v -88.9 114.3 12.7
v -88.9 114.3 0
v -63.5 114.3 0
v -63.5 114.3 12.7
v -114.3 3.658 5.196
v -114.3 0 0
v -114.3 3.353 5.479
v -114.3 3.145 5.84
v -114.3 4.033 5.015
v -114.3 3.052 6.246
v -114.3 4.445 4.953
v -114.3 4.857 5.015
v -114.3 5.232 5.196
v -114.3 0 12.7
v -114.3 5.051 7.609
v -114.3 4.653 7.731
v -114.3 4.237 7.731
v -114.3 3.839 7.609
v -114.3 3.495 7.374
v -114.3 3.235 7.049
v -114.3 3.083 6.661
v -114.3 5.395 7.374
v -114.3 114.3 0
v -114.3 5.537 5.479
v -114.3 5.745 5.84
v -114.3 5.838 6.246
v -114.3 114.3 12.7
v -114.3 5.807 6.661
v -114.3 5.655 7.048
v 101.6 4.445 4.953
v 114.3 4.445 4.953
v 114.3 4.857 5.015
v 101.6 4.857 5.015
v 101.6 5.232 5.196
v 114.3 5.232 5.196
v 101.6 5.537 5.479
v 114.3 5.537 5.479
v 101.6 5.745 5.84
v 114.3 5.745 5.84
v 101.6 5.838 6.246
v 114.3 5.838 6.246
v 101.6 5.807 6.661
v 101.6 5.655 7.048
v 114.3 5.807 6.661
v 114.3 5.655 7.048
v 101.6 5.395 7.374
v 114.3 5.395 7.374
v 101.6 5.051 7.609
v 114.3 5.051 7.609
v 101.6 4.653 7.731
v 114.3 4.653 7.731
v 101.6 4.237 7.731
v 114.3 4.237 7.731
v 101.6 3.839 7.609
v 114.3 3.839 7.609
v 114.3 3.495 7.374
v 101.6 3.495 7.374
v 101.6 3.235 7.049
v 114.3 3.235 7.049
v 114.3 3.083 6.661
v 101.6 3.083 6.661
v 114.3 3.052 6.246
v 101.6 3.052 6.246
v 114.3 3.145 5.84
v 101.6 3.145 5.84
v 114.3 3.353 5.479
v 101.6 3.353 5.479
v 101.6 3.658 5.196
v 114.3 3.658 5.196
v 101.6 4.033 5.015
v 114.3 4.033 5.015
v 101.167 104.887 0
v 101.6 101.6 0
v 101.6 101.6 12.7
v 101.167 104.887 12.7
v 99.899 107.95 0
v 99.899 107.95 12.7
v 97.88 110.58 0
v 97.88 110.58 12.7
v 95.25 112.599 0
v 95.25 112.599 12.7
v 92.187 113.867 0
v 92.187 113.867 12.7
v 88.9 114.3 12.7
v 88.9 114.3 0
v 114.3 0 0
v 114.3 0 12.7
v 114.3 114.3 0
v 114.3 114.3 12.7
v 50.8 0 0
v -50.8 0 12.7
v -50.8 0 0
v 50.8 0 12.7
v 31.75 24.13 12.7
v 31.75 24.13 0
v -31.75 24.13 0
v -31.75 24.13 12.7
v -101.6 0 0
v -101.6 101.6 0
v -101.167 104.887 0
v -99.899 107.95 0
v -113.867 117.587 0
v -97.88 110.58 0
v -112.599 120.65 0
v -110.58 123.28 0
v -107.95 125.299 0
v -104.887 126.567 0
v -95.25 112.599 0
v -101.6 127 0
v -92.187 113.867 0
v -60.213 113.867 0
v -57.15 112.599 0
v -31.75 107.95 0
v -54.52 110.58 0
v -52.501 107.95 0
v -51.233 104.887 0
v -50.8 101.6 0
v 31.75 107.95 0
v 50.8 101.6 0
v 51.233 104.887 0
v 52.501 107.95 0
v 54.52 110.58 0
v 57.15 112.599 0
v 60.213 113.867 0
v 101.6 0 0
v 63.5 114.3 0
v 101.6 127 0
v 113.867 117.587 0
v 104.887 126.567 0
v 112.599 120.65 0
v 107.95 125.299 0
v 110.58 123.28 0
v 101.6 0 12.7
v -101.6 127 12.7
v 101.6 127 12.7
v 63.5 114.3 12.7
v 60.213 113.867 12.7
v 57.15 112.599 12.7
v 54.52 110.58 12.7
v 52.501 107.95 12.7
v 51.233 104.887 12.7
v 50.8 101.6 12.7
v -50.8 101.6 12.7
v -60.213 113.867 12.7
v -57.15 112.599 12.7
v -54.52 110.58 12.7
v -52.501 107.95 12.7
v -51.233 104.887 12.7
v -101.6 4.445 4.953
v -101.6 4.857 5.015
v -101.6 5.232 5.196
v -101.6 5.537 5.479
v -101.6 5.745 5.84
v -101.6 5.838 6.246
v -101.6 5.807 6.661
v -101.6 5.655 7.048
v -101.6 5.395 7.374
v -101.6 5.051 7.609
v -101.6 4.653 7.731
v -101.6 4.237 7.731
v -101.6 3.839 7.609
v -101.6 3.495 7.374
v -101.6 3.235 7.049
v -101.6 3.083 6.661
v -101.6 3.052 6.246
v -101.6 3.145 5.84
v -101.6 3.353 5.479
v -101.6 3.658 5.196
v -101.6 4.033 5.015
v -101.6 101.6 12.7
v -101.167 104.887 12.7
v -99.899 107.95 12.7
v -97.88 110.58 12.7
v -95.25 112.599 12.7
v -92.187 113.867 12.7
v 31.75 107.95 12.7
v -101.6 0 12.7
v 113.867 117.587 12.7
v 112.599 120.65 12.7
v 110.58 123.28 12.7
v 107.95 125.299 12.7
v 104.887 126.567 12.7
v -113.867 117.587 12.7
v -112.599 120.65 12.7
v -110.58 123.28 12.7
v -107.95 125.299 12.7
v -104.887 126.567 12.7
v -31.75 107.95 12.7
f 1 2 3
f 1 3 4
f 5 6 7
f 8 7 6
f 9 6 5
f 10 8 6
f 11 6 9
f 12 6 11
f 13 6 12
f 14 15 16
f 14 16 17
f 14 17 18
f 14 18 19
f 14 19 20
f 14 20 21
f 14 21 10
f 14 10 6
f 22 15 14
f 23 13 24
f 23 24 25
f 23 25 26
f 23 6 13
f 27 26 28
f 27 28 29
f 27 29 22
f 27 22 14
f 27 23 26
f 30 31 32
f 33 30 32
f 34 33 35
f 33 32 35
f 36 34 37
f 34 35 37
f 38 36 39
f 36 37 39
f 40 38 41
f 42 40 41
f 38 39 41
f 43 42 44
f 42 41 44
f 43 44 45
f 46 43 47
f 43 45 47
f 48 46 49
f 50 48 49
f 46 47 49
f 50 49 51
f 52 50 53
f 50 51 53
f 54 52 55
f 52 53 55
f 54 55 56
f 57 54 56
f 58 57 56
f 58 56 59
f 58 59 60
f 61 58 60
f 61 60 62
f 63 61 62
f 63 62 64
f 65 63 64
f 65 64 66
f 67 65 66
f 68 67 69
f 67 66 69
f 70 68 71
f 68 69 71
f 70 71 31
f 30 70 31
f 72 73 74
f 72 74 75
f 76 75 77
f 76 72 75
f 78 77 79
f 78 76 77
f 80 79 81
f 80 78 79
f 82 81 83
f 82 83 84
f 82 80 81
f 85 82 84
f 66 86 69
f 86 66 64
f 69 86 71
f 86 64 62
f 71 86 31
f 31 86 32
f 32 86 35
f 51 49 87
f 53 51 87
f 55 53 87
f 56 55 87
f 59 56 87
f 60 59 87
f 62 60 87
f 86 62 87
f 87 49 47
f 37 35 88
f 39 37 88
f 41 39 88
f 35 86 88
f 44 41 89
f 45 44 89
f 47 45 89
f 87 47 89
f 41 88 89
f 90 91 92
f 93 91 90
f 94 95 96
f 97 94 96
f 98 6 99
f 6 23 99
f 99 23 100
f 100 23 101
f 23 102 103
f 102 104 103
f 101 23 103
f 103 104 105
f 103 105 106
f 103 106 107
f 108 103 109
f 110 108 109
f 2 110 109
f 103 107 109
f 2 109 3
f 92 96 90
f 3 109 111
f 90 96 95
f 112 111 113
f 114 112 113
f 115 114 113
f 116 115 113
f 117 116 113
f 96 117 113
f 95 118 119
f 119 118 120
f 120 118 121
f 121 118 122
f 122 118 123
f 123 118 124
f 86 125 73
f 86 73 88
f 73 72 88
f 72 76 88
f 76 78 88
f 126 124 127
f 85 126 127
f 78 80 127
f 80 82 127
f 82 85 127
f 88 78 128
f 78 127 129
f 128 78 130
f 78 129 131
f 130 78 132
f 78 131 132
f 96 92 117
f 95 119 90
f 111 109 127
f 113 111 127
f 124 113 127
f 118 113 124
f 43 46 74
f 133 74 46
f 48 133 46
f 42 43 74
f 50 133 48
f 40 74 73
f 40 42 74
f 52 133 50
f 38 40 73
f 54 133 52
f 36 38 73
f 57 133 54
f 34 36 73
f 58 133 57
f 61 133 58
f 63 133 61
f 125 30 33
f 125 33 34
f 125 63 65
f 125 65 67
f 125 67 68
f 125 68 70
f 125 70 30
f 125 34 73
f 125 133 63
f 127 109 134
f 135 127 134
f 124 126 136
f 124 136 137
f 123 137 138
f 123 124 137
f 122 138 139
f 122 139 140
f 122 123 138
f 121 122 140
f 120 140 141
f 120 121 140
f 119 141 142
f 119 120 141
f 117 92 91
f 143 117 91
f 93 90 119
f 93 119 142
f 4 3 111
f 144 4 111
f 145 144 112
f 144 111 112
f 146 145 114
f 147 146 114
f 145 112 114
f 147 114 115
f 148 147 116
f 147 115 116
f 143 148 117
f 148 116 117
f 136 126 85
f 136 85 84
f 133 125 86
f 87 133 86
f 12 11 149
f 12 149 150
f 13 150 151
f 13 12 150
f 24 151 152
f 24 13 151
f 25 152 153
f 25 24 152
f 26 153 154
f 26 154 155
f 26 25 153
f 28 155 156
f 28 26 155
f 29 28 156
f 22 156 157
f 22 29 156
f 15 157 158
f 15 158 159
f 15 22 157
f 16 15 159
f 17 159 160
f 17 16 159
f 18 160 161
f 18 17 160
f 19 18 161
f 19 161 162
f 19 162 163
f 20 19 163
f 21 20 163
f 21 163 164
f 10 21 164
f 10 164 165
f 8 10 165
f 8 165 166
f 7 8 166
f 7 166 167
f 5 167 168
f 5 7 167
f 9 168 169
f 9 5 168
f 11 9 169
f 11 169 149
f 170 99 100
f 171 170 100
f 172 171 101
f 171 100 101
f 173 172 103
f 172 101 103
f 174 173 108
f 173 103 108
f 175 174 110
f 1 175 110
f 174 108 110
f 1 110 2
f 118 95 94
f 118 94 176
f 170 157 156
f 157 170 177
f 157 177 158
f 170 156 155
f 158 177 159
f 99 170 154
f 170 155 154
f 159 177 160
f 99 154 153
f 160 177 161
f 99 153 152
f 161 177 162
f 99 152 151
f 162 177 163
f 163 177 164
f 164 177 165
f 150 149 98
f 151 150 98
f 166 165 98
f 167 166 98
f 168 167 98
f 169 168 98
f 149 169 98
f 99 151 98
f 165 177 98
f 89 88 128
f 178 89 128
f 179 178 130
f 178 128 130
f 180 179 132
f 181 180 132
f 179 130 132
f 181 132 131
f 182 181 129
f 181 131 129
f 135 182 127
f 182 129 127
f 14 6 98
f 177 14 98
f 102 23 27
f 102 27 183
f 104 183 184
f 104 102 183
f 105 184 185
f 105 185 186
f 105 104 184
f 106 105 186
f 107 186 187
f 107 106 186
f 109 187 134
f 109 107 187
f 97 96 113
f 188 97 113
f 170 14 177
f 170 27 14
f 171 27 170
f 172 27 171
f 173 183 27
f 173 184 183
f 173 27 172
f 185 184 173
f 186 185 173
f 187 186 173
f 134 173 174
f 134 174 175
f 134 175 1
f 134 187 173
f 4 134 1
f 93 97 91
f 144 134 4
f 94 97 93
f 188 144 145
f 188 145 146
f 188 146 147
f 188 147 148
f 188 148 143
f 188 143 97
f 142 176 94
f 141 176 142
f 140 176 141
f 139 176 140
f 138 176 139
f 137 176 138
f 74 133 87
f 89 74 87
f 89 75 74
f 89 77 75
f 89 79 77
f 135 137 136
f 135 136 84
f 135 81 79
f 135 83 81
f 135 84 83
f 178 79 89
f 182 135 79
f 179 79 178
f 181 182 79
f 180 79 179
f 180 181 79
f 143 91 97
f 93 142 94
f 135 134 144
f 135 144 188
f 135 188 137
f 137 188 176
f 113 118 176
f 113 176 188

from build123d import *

# Parameters (mm, degrees)
SKETCH1_W             = 12.7
SKETCH1_H             = 12.7
BOSS_EXTRUDE1_DEPTH   = 114.3
BOSS_EXTRUDE1_2_DEPTH = 114.3
SKETCH2_W             = 12.7
SKETCH2_H             = 12.7
BOSS_EXTRUDE2_DEPTH   = 228.6
SKETCH3_W             = 101.6
SKETCH3_H             = 12.7
BOSS_EXTRUDE3_DEPTH   = 114.3
SKETCH4_R             = 1.397
CUT_EXTRUDE1_DEPTH    = 12.7
BOSS_EXTRUDE4_DEPTH   = 12.7
CUT_EXTRUDE2_DEPTH    = 12.7
SKETCH7_W             = 63.5
SKETCH7_H             = 83.82
CUT_EXTRUDE3_DEPTH    = 12.7


with BuildPart() as part:
    # Sketch1 → Boss-Extrude1 (new body)
    with BuildSketch(Plane(origin=(0, 0, 0), x_dir=(1, 0, 0), z_dir=(0, 1, 0))):
        with Locations((-107.95, -6.35)):
            Rectangle(SKETCH1_W, SKETCH1_H)
    extrude(amount=BOSS_EXTRUDE1_DEPTH)



with BuildPart() as body_2:
    # Sketch1 → Boss-Extrude1 2 (new body)
    with BuildSketch(Plane(origin=(0, 0, 0), x_dir=(1, 0, 0), z_dir=(0, 1, 0))):
        with Locations((107.95, -6.35)):
            Rectangle(SKETCH1_W, SKETCH1_H)
    extrude(amount=BOSS_EXTRUDE1_2_DEPTH)


with BuildPart() as part_1:
    add(part.part)

    add(body_2.part)  # Boss-Extrude2 merges body 2
    # Sketch2 → Boss-Extrude2 (add)
    with BuildSketch(Plane.ZY.offset(114.3)):
        with Locations((6.35, 120.65)):
            Rectangle(SKETCH2_W, SKETCH2_H)
    extrude(amount=-BOSS_EXTRUDE2_DEPTH)

    # Sketch3 → Boss-Extrude3 (add)
    with BuildSketch(Plane.XZ.offset(-114.3)):
        with Locations((0, 6.35)):
            Rectangle(SKETCH3_W, SKETCH3_H)
    extrude(amount=BOSS_EXTRUDE3_DEPTH)

    # Sketch4 → Cut-Extrude1 (cut)
    with BuildSketch(Plane(origin=(114.3, 0, 0), x_dir=(0, 0, -1), z_dir=(1, 0, 0))):
        with Locations((-6.35, 4.445)):
            Circle(SKETCH4_R)
    cut_extrude1 = extrude(amount=-CUT_EXTRUDE1_DEPTH, mode=Mode.SUBTRACT)

    # Mirror1: Cut-Extrude1 across plane
    add(cut_extrude1.mirror(Plane(origin=(0, 0, 0), x_dir=(0, 0, 1), z_dir=(1, 0, 0))), mode=Mode.SUBTRACT)

    # Sketch5 → Boss-Extrude4 (add)
    with BuildSketch(Plane(origin=(0, 0, 0), x_dir=(-1, 0, 0), z_dir=(0, 0, -1))):
        with BuildLine():
            Line((-101.6, 114.3), (-101.6, 101.6))
            ThreePointArc((-101.6, 101.6), (-97.880256121, 110.580256121), (-88.9, 114.3))
            Line((-88.9, 114.3), (-101.6, 114.3))
        make_face()
        with BuildLine():
            Line((-50.8, 114.3), (-63.5, 114.3))
            ThreePointArc((-63.5, 114.3), (-54.519743879, 110.580256121), (-50.8, 101.6))
            Line((-50.8, 101.6), (-50.8, 114.3))
        make_face()
    boss_extrude4 = extrude(amount=-BOSS_EXTRUDE4_DEPTH)

    # Mirror2: Boss-Extrude4 across plane
    add(boss_extrude4.mirror(Plane(origin=(0, 0, 0), x_dir=(0, 0, 1), z_dir=(1, 0, 0))))

    # Sketch6 → Cut-Extrude2 (cut)
    with BuildSketch(Plane(origin=(0, 0, 0), x_dir=(-1, 0, 0), z_dir=(0, 0, -1))):
        with BuildLine():
            Line((-114.3, 127), (-114.3, 114.3))
            ThreePointArc((-114.3, 114.3), (-110.580256121, 123.280256121), (-101.6, 127))
            Line((-101.6, 127), (-114.3, 127))
        make_face()
    cut_extrude2 = extrude(amount=-CUT_EXTRUDE2_DEPTH, mode=Mode.SUBTRACT)

    # Mirror3: Cut-Extrude2 across plane
    add(cut_extrude2.mirror(Plane(origin=(0, 0, 0), x_dir=(0, 0, 1), z_dir=(1, 0, 0))), mode=Mode.SUBTRACT)

    # Sketch7 → Cut-Extrude3 (cut)
    with BuildSketch(Plane(origin=(0, 0, 0), x_dir=(-1, 0, 0), z_dir=(0, 0, -1))):
        with Locations((0, 66.04)):
            Rectangle(SKETCH7_W, SKETCH7_H)
    extrude(amount=-CUT_EXTRUDE3_DEPTH, mode=Mode.SUBTRACT)


solid = part_1.part
